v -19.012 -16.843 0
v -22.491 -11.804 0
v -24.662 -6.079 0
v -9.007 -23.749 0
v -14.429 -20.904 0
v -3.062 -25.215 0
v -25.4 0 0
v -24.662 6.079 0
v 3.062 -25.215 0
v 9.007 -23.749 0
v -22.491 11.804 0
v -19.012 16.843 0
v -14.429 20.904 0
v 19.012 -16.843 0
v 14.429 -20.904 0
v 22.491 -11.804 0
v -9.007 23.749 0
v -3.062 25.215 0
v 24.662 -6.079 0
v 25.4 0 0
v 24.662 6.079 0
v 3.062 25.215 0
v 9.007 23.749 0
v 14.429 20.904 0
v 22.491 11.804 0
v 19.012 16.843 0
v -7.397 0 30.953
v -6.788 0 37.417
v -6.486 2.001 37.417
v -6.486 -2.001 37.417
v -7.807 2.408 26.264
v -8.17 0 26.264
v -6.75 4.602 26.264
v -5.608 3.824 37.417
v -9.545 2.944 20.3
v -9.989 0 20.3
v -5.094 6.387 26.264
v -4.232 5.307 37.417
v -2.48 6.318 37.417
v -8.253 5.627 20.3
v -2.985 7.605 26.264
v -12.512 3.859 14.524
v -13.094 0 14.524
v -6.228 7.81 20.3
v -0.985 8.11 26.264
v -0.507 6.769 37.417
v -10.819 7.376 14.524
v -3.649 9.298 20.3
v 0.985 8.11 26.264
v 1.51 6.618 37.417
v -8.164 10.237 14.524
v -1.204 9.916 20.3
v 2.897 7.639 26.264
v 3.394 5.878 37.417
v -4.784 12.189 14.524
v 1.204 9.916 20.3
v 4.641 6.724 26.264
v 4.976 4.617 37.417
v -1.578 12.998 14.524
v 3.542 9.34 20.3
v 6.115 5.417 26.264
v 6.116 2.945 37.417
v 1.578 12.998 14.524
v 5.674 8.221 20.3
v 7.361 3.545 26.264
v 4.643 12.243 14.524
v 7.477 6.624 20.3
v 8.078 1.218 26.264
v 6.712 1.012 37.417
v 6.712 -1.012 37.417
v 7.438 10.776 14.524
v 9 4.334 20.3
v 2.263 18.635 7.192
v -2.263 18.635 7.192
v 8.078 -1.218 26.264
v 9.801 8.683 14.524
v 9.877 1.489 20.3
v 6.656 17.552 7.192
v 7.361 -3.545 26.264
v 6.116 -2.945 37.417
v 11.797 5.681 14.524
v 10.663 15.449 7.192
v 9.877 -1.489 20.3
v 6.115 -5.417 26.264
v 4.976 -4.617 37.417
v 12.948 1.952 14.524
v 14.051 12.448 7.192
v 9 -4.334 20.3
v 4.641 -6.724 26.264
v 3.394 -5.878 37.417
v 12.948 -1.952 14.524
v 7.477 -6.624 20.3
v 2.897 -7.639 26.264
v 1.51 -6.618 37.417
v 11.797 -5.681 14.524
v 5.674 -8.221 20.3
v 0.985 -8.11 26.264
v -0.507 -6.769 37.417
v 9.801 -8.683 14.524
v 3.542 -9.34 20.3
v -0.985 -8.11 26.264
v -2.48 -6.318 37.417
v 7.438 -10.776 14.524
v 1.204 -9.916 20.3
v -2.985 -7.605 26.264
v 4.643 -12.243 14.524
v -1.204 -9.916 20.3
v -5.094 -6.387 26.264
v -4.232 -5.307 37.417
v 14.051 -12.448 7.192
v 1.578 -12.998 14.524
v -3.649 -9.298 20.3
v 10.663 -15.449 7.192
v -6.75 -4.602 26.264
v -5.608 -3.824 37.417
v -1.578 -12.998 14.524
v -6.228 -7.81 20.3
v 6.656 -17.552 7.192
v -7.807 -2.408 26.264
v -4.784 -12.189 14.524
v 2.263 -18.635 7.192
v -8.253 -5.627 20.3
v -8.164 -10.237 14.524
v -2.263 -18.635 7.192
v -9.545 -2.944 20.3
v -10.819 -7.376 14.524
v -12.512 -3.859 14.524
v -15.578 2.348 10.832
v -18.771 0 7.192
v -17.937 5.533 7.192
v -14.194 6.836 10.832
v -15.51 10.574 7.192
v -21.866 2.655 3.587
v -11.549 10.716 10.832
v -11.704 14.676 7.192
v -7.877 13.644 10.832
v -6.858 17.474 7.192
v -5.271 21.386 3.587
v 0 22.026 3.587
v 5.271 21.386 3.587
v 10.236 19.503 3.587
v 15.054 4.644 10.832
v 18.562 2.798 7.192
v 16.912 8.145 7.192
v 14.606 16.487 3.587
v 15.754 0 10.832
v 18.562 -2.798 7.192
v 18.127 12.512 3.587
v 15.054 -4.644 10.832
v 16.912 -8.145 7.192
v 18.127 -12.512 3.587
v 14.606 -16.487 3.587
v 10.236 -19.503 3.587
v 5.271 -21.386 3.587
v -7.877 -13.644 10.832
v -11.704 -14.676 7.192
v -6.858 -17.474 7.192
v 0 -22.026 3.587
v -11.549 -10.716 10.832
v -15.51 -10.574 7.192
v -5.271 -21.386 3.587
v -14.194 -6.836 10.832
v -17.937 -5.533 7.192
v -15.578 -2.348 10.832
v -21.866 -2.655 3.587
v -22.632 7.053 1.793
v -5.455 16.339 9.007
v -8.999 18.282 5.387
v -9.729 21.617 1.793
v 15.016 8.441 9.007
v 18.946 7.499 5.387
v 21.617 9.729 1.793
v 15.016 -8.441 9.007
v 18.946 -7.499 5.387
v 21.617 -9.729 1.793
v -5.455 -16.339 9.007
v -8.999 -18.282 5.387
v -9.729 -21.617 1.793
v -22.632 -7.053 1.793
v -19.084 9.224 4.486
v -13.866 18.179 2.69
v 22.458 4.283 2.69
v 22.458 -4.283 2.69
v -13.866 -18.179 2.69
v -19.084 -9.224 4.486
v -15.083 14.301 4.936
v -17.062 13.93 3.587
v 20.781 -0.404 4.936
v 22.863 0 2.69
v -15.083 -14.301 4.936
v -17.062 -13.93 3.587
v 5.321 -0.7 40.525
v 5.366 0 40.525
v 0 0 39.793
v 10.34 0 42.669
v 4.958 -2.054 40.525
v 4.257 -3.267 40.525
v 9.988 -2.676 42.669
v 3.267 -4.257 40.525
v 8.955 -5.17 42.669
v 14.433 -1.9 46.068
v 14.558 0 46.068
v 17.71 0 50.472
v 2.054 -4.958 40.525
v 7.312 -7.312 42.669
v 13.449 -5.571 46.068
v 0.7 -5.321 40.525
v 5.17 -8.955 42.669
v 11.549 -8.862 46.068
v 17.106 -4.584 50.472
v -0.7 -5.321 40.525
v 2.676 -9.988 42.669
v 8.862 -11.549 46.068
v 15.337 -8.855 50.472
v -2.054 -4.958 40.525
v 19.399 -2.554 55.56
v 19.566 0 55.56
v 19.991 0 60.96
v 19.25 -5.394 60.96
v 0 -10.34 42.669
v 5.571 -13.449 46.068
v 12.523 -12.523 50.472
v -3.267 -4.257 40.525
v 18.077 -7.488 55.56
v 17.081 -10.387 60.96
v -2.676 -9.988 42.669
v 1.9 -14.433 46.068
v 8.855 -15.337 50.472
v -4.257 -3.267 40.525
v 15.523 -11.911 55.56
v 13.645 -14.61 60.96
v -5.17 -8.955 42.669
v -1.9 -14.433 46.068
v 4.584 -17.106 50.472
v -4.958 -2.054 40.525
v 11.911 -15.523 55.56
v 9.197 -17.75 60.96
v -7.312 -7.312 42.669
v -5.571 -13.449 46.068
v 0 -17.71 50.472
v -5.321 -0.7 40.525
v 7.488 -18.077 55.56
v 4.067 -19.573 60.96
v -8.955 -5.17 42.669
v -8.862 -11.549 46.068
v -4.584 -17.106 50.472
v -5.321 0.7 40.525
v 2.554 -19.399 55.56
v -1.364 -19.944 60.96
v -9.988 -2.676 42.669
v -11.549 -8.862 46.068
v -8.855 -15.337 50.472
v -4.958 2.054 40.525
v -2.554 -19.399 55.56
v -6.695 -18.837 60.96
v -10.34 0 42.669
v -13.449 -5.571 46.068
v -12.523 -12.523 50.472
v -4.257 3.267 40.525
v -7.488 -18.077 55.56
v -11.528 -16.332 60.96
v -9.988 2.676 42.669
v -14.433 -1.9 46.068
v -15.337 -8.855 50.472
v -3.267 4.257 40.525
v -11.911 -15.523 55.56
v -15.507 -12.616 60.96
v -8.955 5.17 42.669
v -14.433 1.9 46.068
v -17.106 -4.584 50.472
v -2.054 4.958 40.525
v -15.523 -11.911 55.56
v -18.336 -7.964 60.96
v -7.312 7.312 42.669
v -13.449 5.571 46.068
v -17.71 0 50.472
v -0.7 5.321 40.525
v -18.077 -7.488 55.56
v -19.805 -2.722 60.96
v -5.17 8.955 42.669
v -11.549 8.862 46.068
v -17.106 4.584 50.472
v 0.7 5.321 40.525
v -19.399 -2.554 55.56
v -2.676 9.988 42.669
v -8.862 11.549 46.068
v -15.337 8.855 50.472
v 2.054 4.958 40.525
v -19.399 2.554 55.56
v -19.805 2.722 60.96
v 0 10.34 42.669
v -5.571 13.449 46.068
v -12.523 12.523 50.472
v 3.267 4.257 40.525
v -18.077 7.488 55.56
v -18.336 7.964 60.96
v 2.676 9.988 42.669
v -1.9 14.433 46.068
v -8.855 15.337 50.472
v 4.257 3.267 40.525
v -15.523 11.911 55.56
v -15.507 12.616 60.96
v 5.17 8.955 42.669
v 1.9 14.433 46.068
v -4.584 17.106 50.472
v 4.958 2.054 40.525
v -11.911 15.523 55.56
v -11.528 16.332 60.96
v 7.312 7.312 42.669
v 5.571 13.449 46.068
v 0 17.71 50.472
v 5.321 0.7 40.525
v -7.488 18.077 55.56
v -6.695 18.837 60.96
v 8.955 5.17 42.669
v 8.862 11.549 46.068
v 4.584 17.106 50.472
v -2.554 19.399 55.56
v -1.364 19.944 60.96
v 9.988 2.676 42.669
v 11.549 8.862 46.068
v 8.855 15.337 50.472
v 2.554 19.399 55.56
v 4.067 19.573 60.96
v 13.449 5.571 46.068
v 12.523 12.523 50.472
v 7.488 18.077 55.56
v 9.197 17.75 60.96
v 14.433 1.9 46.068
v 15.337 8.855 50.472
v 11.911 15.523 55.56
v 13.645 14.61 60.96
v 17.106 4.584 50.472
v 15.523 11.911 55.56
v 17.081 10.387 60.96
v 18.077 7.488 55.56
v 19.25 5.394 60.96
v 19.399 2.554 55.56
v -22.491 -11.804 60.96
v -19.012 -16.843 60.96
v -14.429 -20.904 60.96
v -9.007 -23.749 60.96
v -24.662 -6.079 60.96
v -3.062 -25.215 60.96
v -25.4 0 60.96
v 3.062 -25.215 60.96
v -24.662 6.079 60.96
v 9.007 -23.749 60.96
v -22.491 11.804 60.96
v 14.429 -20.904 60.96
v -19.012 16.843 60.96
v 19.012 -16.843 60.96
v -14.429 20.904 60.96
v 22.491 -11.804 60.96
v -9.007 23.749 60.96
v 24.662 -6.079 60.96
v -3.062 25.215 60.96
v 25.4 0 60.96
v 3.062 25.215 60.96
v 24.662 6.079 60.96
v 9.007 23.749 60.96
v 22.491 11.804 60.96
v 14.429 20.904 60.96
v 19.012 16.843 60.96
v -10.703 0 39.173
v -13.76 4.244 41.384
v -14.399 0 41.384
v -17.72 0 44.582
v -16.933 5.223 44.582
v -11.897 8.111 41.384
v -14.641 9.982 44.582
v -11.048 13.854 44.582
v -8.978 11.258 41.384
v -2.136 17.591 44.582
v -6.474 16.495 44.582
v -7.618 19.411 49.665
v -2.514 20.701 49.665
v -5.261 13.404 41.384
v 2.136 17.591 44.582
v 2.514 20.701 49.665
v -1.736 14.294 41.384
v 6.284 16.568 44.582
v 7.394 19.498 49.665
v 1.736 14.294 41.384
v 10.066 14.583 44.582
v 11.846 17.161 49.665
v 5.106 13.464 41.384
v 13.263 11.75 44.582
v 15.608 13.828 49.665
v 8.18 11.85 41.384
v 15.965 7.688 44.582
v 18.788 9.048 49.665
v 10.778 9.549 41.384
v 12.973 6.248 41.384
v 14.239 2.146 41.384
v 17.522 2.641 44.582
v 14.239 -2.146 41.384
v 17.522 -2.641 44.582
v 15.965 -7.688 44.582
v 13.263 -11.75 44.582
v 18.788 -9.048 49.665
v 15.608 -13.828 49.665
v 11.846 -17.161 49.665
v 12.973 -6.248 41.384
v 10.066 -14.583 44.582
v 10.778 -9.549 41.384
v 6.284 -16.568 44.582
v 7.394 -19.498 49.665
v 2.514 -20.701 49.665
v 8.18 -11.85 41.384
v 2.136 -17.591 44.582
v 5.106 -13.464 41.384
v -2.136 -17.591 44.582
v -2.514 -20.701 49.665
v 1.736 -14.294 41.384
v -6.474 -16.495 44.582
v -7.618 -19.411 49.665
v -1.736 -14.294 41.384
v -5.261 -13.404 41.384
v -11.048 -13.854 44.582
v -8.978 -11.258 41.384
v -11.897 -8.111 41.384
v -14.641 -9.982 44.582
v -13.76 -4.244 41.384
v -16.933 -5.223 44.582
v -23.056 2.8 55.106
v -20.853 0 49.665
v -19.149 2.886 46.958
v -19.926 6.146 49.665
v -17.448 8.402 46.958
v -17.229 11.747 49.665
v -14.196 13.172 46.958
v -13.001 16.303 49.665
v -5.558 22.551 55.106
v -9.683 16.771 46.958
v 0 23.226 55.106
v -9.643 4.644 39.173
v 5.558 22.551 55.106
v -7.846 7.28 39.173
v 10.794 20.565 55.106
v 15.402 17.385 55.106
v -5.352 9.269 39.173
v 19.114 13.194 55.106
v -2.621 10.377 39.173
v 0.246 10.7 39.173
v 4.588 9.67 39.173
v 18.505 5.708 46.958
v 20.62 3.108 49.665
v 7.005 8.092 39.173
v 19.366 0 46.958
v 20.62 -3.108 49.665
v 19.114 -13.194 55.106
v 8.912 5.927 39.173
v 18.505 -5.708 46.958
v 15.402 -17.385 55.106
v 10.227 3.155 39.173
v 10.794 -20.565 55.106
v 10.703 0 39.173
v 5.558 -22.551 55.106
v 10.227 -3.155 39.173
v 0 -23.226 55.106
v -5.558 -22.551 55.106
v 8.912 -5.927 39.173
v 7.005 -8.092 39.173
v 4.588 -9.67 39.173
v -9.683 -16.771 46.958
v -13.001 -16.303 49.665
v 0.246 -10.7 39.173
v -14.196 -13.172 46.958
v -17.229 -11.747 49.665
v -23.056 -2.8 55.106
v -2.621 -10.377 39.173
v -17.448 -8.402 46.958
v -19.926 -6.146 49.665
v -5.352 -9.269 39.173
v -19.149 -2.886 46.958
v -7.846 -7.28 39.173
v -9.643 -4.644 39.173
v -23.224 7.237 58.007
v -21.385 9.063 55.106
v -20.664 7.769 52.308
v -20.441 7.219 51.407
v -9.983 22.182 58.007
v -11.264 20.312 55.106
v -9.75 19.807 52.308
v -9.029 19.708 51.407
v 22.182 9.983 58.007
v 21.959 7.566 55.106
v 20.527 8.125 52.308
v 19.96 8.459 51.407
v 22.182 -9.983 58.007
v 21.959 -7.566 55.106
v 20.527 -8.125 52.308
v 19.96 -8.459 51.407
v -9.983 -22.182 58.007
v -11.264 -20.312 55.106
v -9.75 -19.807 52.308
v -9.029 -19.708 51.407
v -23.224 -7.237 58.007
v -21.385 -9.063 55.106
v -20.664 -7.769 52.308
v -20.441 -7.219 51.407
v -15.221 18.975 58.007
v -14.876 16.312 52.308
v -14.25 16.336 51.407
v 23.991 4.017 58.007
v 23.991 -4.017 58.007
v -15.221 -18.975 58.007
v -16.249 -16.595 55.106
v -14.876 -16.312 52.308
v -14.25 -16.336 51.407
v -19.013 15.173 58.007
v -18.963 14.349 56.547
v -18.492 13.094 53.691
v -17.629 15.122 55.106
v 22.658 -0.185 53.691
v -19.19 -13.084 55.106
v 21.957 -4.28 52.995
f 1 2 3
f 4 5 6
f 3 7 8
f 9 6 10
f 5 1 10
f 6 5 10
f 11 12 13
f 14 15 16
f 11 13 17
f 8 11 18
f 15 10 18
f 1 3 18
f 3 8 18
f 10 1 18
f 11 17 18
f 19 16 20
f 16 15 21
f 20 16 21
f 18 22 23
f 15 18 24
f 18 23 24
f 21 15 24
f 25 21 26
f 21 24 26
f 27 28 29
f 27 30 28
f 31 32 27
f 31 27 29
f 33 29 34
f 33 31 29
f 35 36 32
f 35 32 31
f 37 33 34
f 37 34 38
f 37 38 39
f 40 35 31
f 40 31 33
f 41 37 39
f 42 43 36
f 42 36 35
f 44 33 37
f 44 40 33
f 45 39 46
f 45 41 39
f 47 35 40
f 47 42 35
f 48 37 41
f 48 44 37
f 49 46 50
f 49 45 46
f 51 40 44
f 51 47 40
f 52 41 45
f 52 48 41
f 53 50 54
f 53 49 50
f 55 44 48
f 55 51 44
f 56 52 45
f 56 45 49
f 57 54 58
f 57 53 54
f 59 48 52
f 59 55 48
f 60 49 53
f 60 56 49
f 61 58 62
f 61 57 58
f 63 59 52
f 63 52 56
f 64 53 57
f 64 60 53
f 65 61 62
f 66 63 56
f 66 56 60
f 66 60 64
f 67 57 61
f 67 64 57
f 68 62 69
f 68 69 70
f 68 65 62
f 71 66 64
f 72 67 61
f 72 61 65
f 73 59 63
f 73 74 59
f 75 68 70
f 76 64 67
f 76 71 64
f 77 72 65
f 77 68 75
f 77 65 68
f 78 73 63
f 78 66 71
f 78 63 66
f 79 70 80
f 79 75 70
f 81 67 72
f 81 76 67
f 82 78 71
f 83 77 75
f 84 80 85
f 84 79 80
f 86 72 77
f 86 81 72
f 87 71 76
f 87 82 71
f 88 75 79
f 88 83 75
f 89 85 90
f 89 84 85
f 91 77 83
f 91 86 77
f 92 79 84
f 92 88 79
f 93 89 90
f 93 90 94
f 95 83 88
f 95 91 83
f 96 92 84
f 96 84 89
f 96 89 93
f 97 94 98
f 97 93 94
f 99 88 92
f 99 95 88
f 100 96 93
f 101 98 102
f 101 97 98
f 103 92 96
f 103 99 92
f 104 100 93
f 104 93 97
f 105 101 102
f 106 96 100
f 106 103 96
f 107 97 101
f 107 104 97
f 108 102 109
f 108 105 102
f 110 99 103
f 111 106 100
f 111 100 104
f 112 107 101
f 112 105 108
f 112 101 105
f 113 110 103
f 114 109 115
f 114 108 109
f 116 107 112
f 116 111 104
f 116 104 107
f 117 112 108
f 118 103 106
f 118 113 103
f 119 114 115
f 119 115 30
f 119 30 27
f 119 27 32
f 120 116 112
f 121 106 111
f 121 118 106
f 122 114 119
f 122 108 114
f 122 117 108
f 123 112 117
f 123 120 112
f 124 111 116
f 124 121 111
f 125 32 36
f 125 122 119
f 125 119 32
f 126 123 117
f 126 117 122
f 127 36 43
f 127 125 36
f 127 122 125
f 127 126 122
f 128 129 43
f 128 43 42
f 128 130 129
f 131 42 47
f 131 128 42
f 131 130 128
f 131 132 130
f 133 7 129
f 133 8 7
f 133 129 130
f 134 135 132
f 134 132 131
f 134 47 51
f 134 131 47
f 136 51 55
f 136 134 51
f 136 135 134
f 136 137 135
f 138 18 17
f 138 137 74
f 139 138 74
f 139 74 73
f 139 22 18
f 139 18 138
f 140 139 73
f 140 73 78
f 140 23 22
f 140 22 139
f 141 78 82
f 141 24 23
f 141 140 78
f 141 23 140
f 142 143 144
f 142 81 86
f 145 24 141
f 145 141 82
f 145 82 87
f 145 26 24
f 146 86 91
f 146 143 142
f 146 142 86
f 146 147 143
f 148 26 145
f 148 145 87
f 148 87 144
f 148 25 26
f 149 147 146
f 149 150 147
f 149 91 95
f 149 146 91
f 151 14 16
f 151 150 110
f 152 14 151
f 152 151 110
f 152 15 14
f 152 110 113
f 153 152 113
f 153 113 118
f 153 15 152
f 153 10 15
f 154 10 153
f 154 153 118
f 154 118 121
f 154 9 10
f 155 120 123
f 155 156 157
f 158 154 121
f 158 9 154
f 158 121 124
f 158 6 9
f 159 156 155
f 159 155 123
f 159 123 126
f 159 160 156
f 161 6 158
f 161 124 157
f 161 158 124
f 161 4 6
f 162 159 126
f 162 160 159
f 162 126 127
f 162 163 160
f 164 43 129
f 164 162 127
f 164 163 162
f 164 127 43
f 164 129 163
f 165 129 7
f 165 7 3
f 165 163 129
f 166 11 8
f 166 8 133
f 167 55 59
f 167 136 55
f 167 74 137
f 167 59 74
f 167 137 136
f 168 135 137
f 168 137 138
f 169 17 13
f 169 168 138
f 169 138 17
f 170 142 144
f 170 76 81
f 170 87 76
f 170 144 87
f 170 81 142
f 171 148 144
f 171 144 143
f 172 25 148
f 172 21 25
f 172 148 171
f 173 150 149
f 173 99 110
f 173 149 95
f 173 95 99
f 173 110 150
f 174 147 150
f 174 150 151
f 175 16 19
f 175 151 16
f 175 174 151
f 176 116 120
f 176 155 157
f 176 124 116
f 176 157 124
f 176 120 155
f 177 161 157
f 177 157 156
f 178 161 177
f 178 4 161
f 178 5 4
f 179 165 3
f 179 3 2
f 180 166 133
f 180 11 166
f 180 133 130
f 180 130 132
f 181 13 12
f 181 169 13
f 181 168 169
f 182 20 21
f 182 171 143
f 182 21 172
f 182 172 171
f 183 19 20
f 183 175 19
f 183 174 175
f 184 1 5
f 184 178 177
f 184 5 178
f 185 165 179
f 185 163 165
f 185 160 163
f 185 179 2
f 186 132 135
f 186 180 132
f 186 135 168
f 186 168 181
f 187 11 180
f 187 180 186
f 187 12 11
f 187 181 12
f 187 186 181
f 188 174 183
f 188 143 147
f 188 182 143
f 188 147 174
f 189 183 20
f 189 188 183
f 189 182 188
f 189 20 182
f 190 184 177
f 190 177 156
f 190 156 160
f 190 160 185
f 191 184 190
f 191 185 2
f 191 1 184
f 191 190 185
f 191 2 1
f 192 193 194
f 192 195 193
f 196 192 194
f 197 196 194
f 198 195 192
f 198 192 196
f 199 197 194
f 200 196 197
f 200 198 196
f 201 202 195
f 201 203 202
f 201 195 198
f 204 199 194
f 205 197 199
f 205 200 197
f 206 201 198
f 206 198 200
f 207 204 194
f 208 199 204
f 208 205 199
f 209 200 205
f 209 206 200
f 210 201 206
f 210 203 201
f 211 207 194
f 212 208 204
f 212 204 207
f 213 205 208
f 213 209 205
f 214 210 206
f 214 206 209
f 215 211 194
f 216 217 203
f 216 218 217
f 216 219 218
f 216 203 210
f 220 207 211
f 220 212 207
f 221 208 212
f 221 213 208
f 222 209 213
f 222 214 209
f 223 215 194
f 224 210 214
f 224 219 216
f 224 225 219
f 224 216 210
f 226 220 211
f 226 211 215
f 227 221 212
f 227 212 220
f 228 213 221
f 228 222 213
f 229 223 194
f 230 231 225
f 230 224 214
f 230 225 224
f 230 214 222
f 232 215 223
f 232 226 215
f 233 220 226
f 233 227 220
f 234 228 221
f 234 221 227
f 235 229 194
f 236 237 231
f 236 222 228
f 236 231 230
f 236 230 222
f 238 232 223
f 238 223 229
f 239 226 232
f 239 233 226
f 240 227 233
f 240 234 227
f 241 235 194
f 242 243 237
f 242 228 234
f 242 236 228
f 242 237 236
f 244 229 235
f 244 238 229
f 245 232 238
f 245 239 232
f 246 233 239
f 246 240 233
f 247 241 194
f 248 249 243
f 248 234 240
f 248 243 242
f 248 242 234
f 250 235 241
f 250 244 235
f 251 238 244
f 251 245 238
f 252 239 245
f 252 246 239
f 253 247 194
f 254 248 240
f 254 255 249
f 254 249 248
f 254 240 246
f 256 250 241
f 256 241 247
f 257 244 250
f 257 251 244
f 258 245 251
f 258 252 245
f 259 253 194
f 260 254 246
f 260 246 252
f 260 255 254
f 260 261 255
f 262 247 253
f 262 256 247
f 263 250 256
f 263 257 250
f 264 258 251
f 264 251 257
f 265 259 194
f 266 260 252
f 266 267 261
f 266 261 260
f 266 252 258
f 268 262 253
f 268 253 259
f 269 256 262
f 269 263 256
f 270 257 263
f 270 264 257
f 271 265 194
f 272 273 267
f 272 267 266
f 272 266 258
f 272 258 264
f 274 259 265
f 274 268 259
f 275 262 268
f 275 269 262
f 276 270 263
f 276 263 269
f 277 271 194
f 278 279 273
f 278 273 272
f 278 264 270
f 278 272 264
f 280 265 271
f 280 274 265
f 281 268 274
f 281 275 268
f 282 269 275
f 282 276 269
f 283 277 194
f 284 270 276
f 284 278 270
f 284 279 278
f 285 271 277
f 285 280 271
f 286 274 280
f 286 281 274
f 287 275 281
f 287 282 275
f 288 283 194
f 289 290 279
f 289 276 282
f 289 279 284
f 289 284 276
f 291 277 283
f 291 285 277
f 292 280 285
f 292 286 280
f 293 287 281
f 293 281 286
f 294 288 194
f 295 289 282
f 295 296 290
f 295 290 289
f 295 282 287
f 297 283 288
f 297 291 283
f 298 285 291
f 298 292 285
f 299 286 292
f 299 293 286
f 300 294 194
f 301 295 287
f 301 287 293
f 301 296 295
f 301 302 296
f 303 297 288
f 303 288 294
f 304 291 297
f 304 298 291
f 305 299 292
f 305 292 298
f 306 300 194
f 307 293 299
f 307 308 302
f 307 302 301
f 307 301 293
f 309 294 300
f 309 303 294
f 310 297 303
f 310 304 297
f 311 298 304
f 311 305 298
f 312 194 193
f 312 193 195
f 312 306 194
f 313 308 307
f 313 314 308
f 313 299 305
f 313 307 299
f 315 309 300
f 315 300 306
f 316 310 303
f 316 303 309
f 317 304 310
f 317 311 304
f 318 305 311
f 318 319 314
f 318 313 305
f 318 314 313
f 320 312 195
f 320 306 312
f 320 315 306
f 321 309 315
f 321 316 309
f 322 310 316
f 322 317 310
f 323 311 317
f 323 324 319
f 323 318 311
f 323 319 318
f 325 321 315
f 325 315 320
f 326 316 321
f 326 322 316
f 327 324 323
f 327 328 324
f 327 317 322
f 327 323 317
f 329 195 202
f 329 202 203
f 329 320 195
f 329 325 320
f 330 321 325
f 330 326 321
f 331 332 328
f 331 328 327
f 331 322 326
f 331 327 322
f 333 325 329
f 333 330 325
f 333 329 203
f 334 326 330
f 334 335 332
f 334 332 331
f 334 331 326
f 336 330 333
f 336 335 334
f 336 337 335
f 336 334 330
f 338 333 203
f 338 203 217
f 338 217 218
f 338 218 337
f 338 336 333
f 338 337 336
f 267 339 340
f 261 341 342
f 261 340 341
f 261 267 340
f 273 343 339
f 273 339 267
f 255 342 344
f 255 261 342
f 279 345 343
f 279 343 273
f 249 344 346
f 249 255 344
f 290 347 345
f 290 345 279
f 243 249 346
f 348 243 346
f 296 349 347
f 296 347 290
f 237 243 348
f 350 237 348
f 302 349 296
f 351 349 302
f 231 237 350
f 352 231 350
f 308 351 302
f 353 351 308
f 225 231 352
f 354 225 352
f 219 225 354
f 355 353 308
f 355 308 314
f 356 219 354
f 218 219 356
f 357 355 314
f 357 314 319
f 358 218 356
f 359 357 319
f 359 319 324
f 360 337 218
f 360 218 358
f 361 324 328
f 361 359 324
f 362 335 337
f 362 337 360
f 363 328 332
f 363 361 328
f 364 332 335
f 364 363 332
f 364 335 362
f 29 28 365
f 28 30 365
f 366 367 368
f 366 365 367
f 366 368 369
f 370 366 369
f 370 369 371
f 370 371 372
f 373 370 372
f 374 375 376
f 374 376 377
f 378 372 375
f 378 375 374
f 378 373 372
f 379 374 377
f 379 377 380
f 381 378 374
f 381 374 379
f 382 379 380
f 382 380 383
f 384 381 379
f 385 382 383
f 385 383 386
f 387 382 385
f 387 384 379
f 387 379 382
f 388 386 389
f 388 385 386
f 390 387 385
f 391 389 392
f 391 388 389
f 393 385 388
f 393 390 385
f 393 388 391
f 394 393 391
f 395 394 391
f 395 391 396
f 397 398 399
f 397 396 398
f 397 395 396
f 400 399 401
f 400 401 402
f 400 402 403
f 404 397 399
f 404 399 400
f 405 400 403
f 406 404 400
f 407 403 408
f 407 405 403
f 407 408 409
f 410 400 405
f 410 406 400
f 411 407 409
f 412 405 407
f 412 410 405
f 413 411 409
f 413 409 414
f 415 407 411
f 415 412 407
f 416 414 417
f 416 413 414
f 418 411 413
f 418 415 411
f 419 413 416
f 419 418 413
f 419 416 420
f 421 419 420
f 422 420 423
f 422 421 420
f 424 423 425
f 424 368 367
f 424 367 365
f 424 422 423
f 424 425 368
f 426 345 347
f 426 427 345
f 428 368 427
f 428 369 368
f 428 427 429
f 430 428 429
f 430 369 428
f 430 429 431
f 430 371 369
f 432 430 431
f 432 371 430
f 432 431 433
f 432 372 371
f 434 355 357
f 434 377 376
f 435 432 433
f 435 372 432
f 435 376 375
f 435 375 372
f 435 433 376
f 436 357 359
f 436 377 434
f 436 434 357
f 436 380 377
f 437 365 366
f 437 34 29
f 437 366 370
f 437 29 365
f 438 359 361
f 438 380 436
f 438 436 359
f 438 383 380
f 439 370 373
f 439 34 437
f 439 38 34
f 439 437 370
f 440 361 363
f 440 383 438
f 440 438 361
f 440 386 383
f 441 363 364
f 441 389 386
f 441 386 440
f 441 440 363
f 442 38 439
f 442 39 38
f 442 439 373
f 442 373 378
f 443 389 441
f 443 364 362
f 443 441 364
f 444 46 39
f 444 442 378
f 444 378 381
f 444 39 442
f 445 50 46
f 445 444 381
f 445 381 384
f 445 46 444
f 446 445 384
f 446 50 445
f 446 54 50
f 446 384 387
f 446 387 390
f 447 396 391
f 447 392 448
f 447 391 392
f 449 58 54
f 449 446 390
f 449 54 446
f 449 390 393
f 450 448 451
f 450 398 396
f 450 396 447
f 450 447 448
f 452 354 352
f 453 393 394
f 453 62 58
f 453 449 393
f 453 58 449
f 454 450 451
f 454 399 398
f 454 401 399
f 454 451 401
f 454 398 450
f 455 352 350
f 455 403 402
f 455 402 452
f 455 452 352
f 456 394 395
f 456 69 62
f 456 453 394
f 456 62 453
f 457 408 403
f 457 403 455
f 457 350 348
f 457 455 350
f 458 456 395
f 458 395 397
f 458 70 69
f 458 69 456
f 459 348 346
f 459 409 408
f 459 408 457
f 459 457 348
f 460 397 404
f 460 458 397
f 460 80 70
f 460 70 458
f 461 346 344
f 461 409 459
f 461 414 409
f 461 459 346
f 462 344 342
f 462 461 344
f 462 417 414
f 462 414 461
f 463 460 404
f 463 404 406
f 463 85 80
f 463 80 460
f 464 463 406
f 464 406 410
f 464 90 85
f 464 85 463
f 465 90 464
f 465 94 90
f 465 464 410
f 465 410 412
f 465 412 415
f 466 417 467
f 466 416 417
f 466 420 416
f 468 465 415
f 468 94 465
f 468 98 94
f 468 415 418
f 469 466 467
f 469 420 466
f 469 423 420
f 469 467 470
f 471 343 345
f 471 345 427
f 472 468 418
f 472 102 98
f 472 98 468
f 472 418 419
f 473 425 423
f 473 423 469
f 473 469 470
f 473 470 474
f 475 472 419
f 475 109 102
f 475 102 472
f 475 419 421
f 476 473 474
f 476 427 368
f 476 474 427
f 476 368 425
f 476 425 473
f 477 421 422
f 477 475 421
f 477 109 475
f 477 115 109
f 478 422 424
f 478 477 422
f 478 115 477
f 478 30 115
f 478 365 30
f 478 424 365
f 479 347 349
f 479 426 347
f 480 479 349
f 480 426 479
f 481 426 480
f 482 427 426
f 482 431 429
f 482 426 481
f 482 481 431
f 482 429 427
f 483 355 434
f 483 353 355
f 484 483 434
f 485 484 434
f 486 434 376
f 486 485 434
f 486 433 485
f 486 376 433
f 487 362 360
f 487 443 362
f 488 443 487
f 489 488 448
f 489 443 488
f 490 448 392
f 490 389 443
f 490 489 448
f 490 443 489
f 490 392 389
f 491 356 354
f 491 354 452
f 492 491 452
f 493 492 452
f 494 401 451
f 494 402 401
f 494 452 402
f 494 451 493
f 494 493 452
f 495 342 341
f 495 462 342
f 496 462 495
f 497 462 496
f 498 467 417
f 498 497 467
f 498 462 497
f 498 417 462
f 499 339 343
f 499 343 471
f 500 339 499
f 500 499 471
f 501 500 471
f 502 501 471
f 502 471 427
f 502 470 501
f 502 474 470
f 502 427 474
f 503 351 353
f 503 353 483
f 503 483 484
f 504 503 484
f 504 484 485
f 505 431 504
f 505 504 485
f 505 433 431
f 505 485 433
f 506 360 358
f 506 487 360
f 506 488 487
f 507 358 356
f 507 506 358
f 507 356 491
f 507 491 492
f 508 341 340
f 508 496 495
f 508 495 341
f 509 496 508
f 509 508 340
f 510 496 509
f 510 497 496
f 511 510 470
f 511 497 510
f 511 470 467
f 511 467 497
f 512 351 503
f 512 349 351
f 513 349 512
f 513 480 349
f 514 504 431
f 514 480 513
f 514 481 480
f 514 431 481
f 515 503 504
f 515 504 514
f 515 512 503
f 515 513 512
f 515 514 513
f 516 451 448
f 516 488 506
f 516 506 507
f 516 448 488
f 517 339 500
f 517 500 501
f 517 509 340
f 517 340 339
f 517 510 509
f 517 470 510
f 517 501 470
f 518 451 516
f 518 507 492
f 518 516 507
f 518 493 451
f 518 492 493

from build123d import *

# Parameters (mm, degrees)
F0_R     = 25.4
F1_DEPTH = 60.96


with BuildPart() as f1:
    # F0 (on Top) → F1 (new body)
    with BuildSketch(Plane.XY):
        Circle(F0_R)
    extrude(amount=F1_DEPTH)

    # F2 (on Front) → F3 (revolve, cut)
    with BuildSketch(Plane.XZ):
        with BuildLine():
            add(Edge.make_bspline(
                [(-25.4, 60.96), (-23.0064342821, 54.3382376616), (-18.7242288008, 42.4915827865), (-10.4409751257, 38.9702499578), (-6.7876982503, 37.4171882868)],
                knots=[0, 0, 0, 0, 0.5589562968, 1, 1, 1, 1], degree=3))
            Line((-25.4, 60.96), (-25.4, 0))
            add(Edge.make_bspline(
                [(-6.7876982503, 37.4171882868), (-7.2772344038, 31.2583061805), (-8.3285058101, 18.0322010073), (-19.4547919938, 6.2797775406), (-25.4, 0)],
                knots=[0, 0, 0, 0, 0.4656610563, 1, 1, 1, 1], degree=3))
        make_face()
    revolve(axis=Axis((0, 0, 26.0477950796), (0, 0, -1)), mode=Mode.SUBTRACT)

    # F4 (on Front) → F5 (revolve, cut)
    with BuildSketch(Plane.XZ):
        with BuildLine():
            Line((0, 79.8403099308), (0, 39.7928841284))
            ThreePointArc((0, 39.7928841284), (20.0237129012, 59.8165970296), (0, 79.8403099308))
        make_face()
    revolve(axis=Axis((0, 0, 59.8165970296), (0, 0, -1)), mode=Mode.SUBTRACT)


solid = f1.part
